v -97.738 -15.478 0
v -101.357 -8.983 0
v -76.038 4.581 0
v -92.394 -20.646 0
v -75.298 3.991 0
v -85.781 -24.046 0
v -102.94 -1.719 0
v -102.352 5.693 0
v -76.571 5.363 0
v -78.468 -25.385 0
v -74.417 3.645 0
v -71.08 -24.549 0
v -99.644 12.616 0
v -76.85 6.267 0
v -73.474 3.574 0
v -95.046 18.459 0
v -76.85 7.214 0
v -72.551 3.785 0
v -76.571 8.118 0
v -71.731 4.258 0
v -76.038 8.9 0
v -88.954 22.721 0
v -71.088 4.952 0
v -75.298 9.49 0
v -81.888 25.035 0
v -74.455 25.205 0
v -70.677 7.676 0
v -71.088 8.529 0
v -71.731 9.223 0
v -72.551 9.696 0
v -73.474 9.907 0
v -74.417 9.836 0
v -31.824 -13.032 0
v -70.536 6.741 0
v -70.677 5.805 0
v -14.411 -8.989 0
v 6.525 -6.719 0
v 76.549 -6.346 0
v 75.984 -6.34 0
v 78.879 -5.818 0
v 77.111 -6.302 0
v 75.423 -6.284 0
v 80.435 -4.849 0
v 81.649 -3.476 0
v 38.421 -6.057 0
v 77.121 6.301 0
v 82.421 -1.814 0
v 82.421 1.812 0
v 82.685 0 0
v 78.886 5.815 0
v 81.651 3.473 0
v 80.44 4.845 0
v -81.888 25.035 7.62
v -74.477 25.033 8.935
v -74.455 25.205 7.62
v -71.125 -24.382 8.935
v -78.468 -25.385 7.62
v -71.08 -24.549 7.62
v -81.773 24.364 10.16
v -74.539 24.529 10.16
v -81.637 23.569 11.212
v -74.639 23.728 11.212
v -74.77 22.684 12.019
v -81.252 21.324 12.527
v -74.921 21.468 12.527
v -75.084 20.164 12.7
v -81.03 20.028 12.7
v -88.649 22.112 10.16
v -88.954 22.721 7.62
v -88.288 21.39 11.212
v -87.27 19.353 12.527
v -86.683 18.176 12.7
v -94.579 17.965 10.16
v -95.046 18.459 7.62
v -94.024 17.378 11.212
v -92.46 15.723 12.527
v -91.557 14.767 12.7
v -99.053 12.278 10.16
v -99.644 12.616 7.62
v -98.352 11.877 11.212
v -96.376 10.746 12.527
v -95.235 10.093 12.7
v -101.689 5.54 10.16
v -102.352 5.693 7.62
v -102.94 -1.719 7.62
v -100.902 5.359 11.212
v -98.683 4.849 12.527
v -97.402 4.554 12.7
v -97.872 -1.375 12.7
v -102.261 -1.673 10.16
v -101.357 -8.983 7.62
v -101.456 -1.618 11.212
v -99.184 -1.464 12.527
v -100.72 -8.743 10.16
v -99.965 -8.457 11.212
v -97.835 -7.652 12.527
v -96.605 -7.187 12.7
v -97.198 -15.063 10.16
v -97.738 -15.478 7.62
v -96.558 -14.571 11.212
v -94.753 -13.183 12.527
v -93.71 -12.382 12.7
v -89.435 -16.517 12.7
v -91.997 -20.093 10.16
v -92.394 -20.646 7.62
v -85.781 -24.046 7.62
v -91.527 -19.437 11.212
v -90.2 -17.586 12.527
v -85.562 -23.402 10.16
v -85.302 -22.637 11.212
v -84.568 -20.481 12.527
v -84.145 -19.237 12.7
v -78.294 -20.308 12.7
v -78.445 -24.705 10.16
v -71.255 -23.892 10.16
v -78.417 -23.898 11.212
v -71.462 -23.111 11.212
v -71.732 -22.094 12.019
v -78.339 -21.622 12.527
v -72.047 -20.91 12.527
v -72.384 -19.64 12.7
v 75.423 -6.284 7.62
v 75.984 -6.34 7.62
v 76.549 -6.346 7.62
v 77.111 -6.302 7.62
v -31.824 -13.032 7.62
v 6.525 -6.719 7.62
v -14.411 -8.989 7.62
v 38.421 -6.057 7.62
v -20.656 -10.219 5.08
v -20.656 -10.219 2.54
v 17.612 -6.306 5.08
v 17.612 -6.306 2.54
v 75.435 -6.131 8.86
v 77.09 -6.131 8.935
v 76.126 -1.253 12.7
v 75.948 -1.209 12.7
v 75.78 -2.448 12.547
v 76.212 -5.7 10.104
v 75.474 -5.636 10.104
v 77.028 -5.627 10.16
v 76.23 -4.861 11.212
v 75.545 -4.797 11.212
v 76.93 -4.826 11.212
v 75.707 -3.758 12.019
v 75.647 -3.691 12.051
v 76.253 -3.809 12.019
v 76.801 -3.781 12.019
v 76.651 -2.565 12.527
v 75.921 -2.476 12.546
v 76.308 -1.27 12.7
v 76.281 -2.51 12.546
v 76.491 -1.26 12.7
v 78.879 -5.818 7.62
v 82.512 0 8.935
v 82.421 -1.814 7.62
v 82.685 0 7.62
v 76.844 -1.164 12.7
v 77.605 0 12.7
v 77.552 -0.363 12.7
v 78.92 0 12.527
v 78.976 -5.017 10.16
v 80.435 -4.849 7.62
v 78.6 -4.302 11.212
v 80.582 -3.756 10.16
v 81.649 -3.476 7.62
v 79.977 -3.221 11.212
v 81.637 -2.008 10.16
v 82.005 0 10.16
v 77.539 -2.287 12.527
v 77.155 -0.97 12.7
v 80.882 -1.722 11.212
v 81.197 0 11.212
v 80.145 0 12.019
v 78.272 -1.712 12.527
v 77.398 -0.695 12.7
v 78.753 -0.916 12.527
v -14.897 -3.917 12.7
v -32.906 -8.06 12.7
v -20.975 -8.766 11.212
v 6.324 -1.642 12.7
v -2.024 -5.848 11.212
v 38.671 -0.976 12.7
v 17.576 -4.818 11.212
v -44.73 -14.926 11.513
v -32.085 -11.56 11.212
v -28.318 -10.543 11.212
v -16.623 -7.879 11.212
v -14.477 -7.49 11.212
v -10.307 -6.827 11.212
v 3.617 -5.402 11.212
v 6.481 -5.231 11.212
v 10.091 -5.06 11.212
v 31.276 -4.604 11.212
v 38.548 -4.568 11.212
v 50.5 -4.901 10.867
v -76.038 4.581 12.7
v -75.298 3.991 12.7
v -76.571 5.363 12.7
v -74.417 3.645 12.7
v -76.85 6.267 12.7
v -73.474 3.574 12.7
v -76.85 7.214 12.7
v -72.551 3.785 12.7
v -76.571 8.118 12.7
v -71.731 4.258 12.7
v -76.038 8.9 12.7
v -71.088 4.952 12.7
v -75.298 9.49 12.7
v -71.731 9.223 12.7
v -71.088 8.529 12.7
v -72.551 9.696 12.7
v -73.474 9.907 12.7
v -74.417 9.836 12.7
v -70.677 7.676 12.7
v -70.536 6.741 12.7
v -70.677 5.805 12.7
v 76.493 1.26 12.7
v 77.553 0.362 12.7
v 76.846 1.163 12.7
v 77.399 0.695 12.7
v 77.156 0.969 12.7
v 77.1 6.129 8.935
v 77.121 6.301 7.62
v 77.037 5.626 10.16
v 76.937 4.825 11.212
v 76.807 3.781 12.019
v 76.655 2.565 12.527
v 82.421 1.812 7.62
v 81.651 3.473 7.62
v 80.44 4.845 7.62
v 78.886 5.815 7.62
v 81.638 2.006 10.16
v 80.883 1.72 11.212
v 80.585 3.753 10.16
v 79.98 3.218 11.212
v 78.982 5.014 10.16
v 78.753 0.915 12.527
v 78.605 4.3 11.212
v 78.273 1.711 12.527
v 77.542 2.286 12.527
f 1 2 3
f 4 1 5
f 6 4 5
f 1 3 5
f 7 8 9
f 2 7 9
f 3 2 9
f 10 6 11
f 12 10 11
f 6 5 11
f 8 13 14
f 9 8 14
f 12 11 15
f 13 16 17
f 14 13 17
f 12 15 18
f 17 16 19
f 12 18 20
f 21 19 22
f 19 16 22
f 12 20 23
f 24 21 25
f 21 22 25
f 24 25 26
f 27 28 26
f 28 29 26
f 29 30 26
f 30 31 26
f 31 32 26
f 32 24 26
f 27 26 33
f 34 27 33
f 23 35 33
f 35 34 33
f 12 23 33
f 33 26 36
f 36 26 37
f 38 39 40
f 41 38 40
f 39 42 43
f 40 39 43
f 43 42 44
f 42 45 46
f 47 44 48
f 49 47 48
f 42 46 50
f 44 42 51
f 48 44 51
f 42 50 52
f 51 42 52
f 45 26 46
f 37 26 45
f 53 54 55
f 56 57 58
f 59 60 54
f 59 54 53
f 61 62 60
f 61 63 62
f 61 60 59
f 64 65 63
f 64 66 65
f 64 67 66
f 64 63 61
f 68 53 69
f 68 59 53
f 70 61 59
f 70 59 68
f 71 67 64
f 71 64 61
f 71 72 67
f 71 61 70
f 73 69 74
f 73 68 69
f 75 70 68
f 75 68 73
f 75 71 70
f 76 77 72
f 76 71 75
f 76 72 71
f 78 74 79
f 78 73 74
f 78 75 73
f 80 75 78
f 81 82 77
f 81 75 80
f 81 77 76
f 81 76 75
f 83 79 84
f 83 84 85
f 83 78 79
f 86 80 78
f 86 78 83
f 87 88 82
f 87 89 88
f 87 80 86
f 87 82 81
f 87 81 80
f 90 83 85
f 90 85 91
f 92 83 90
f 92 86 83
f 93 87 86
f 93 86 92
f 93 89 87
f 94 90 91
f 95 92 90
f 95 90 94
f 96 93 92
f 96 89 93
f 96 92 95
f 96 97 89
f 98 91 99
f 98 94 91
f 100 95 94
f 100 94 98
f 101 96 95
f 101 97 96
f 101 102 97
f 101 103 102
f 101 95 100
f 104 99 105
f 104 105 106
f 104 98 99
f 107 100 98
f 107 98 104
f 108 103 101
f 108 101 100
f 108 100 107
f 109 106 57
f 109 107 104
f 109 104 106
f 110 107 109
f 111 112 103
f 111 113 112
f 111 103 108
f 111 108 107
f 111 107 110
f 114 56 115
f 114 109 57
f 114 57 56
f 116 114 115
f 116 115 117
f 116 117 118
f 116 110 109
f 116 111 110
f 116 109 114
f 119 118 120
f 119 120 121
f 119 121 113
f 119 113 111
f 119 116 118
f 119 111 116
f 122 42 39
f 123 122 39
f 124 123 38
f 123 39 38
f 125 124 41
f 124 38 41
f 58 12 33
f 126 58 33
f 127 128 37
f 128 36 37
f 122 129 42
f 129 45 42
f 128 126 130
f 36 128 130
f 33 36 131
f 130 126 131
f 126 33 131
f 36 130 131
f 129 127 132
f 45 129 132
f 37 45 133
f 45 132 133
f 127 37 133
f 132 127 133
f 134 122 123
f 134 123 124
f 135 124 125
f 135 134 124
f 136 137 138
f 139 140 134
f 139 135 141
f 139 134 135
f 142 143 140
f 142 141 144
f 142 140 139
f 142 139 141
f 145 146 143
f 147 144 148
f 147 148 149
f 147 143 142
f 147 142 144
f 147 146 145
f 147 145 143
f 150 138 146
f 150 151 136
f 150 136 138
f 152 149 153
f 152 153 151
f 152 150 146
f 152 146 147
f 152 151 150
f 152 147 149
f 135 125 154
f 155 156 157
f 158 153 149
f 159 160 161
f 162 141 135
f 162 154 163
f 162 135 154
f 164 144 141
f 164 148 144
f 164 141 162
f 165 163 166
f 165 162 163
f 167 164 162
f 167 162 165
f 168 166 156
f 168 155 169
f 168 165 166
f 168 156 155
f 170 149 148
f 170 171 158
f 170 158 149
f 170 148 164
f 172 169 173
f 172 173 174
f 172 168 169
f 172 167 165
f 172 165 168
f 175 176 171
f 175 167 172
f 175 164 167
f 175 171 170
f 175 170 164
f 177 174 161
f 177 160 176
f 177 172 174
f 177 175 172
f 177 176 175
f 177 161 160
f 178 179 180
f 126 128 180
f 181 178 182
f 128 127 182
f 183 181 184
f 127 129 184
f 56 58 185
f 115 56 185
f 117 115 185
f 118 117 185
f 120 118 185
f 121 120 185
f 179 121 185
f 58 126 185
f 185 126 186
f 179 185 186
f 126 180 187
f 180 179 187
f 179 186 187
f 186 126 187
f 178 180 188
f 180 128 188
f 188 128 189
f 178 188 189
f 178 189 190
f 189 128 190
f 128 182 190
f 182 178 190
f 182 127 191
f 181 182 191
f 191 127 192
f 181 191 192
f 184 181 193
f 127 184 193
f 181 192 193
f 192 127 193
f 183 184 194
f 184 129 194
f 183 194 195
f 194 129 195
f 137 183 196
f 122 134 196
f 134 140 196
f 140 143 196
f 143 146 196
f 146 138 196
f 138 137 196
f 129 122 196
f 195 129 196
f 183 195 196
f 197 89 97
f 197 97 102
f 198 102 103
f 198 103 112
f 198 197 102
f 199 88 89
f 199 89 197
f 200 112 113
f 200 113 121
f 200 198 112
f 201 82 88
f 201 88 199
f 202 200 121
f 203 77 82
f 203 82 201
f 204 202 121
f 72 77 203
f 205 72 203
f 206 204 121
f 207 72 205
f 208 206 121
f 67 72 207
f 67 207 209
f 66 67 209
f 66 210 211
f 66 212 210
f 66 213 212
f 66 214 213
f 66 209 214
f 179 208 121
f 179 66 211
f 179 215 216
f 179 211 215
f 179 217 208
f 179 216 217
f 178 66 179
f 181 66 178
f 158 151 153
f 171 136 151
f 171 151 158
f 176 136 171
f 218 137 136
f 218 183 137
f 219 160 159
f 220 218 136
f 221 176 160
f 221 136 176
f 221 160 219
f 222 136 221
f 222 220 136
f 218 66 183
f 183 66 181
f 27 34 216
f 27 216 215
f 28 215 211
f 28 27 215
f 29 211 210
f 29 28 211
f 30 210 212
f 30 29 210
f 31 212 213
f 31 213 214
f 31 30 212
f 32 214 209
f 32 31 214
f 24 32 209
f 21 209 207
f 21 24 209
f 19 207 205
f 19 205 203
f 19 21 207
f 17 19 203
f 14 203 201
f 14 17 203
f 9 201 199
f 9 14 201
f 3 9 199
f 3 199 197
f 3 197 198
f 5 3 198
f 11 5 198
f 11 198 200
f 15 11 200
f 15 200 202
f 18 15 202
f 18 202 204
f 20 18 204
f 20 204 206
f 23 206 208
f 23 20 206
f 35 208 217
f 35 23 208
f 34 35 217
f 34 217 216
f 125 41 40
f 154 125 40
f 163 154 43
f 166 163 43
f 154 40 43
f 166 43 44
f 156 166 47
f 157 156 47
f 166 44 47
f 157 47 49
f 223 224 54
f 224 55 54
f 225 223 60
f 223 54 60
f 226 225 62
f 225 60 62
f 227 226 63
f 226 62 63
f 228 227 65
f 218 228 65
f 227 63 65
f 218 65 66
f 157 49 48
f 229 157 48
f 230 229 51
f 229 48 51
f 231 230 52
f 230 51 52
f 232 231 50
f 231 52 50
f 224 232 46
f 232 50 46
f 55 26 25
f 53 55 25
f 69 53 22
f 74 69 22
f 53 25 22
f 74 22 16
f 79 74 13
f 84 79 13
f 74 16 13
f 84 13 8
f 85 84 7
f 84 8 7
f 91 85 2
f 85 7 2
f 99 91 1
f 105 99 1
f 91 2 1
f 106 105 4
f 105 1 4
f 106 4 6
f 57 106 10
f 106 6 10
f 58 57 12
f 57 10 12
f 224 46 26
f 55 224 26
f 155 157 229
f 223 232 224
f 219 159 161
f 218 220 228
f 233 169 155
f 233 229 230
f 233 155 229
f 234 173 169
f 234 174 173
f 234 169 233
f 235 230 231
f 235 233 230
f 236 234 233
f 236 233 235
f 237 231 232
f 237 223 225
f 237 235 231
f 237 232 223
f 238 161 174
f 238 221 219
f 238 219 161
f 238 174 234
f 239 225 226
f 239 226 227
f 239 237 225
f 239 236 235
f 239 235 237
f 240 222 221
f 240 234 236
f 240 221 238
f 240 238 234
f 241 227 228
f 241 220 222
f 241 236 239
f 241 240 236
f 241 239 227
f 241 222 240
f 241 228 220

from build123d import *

# Parameters (mm, degrees)
F0_R     = 3.175
F1_DEPTH = 12.7
F2_R     = 5.08


with BuildPart() as f1:
    # F0 (on Top) → F1 (new body)
    with BuildSketch(Plane.XY):
        with BuildLine():
            ThreePointArc((-71.0804048989, -24.5493938467), (-57.4650398626, -15.4854298619), (-52.1986302525, 0))
            ThreePointArc((-52.1986302525, 0), (-58.5591797737, 16.8124752926), (-74.4552700528, 25.2047473039))
            ThreePointArc((-74.4552700528, 25.2047473039), (-102.9403981321, -1.7189533851), (-71.0804048989, -24.5493938467))
        make_face()
        with Locations((-73.7108141184, 6.740516983)):
            Circle(F0_R, mode=Mode.SUBTRACT)
        with BuildLine():
            ThreePointArc((-74.4552700528, 25.2047473039), (-58.5591797737, 16.8124752926), (-52.1986302525, 0))
            ThreePointArc((-52.1986302525, 0), (-57.4650398626, -15.4854298619), (-71.0804048989, -24.5493938467))
            add(Edge.make_bspline(
                [(-71.0804048989, -24.5493938467), (-52.7412181623, -19.6800698748), (-21.1502646093, -8.2520622264), (17.6363924631, -5.7514904756), (54.7287005753, -6.0609514179), (75.4228812113, -6.2840965851)],
                knots=[0, 0, 0, 0, 0.3422286689, 0.6353969827, 0.9903505149, 0.9903505149, 0.9903505149, 0.9903505149], degree=3))
            ThreePointArc((75.4228812113, -6.2840965851), (70.0424065813, 0.8492058566), (77.1212069372, 6.301186826))
            Line((77.1212069372, 6.301186826), (-74.4552700528, 25.2047473039))
        make_face()
        with BuildLine():
            ThreePointArc((82.6853668873, 0), (81.095229507, 4.2031188231), (77.1212069372, 6.301186826))
            ThreePointArc((77.1212069372, 6.301186826), (70.0424065813, 0.8492058566), (75.4228812113, -6.2840965851))
            add(Edge.make_bspline(
                [(75.4228812113, -6.2840965851), (75.9854567877, -6.2901628326), (76.5483132187, -6.2962687399), (77.1113875818, -6.3024036591)],
                knots=[0.9903505149, 0.9903505149, 0.9903505149, 0.9903505149, 1, 1, 1, 1], degree=3))
            ThreePointArc((77.1113875818, -6.3024036591), (81.0919534475, -4.2068259169), (82.6853668873, 0))
        make_face()
        with BuildLine():
            add(Edge.make_bspline(
                [(75.4228812113, -6.2840965851), (75.9854567877, -6.2901628326), (76.5483132187, -6.2962687399), (77.1113875818, -6.3024036591)],
                knots=[0.9903505149, 0.9903505149, 0.9903505149, 0.9903505149, 1, 1, 1, 1], degree=3))
            ThreePointArc((75.4228812113, -6.2840965851), (76.266523151, -6.3496268032), (77.1113875818, -6.3024036591))
        make_face()
    extrude(amount=F1_DEPTH)

    # F2
    f2_edges = [f1.edges().sort_by_distance(p)[0] for p in [
        (-102.940398, -1.718953, 12.7),
        (1.057114, -7.077023, 12.7),
        (1.332968, 15.752967, 12.7),
        (82.628327, -0.849206, 12.7),
    ]]
    fillet(f2_edges, radius=F2_R)


solid = f1.part
